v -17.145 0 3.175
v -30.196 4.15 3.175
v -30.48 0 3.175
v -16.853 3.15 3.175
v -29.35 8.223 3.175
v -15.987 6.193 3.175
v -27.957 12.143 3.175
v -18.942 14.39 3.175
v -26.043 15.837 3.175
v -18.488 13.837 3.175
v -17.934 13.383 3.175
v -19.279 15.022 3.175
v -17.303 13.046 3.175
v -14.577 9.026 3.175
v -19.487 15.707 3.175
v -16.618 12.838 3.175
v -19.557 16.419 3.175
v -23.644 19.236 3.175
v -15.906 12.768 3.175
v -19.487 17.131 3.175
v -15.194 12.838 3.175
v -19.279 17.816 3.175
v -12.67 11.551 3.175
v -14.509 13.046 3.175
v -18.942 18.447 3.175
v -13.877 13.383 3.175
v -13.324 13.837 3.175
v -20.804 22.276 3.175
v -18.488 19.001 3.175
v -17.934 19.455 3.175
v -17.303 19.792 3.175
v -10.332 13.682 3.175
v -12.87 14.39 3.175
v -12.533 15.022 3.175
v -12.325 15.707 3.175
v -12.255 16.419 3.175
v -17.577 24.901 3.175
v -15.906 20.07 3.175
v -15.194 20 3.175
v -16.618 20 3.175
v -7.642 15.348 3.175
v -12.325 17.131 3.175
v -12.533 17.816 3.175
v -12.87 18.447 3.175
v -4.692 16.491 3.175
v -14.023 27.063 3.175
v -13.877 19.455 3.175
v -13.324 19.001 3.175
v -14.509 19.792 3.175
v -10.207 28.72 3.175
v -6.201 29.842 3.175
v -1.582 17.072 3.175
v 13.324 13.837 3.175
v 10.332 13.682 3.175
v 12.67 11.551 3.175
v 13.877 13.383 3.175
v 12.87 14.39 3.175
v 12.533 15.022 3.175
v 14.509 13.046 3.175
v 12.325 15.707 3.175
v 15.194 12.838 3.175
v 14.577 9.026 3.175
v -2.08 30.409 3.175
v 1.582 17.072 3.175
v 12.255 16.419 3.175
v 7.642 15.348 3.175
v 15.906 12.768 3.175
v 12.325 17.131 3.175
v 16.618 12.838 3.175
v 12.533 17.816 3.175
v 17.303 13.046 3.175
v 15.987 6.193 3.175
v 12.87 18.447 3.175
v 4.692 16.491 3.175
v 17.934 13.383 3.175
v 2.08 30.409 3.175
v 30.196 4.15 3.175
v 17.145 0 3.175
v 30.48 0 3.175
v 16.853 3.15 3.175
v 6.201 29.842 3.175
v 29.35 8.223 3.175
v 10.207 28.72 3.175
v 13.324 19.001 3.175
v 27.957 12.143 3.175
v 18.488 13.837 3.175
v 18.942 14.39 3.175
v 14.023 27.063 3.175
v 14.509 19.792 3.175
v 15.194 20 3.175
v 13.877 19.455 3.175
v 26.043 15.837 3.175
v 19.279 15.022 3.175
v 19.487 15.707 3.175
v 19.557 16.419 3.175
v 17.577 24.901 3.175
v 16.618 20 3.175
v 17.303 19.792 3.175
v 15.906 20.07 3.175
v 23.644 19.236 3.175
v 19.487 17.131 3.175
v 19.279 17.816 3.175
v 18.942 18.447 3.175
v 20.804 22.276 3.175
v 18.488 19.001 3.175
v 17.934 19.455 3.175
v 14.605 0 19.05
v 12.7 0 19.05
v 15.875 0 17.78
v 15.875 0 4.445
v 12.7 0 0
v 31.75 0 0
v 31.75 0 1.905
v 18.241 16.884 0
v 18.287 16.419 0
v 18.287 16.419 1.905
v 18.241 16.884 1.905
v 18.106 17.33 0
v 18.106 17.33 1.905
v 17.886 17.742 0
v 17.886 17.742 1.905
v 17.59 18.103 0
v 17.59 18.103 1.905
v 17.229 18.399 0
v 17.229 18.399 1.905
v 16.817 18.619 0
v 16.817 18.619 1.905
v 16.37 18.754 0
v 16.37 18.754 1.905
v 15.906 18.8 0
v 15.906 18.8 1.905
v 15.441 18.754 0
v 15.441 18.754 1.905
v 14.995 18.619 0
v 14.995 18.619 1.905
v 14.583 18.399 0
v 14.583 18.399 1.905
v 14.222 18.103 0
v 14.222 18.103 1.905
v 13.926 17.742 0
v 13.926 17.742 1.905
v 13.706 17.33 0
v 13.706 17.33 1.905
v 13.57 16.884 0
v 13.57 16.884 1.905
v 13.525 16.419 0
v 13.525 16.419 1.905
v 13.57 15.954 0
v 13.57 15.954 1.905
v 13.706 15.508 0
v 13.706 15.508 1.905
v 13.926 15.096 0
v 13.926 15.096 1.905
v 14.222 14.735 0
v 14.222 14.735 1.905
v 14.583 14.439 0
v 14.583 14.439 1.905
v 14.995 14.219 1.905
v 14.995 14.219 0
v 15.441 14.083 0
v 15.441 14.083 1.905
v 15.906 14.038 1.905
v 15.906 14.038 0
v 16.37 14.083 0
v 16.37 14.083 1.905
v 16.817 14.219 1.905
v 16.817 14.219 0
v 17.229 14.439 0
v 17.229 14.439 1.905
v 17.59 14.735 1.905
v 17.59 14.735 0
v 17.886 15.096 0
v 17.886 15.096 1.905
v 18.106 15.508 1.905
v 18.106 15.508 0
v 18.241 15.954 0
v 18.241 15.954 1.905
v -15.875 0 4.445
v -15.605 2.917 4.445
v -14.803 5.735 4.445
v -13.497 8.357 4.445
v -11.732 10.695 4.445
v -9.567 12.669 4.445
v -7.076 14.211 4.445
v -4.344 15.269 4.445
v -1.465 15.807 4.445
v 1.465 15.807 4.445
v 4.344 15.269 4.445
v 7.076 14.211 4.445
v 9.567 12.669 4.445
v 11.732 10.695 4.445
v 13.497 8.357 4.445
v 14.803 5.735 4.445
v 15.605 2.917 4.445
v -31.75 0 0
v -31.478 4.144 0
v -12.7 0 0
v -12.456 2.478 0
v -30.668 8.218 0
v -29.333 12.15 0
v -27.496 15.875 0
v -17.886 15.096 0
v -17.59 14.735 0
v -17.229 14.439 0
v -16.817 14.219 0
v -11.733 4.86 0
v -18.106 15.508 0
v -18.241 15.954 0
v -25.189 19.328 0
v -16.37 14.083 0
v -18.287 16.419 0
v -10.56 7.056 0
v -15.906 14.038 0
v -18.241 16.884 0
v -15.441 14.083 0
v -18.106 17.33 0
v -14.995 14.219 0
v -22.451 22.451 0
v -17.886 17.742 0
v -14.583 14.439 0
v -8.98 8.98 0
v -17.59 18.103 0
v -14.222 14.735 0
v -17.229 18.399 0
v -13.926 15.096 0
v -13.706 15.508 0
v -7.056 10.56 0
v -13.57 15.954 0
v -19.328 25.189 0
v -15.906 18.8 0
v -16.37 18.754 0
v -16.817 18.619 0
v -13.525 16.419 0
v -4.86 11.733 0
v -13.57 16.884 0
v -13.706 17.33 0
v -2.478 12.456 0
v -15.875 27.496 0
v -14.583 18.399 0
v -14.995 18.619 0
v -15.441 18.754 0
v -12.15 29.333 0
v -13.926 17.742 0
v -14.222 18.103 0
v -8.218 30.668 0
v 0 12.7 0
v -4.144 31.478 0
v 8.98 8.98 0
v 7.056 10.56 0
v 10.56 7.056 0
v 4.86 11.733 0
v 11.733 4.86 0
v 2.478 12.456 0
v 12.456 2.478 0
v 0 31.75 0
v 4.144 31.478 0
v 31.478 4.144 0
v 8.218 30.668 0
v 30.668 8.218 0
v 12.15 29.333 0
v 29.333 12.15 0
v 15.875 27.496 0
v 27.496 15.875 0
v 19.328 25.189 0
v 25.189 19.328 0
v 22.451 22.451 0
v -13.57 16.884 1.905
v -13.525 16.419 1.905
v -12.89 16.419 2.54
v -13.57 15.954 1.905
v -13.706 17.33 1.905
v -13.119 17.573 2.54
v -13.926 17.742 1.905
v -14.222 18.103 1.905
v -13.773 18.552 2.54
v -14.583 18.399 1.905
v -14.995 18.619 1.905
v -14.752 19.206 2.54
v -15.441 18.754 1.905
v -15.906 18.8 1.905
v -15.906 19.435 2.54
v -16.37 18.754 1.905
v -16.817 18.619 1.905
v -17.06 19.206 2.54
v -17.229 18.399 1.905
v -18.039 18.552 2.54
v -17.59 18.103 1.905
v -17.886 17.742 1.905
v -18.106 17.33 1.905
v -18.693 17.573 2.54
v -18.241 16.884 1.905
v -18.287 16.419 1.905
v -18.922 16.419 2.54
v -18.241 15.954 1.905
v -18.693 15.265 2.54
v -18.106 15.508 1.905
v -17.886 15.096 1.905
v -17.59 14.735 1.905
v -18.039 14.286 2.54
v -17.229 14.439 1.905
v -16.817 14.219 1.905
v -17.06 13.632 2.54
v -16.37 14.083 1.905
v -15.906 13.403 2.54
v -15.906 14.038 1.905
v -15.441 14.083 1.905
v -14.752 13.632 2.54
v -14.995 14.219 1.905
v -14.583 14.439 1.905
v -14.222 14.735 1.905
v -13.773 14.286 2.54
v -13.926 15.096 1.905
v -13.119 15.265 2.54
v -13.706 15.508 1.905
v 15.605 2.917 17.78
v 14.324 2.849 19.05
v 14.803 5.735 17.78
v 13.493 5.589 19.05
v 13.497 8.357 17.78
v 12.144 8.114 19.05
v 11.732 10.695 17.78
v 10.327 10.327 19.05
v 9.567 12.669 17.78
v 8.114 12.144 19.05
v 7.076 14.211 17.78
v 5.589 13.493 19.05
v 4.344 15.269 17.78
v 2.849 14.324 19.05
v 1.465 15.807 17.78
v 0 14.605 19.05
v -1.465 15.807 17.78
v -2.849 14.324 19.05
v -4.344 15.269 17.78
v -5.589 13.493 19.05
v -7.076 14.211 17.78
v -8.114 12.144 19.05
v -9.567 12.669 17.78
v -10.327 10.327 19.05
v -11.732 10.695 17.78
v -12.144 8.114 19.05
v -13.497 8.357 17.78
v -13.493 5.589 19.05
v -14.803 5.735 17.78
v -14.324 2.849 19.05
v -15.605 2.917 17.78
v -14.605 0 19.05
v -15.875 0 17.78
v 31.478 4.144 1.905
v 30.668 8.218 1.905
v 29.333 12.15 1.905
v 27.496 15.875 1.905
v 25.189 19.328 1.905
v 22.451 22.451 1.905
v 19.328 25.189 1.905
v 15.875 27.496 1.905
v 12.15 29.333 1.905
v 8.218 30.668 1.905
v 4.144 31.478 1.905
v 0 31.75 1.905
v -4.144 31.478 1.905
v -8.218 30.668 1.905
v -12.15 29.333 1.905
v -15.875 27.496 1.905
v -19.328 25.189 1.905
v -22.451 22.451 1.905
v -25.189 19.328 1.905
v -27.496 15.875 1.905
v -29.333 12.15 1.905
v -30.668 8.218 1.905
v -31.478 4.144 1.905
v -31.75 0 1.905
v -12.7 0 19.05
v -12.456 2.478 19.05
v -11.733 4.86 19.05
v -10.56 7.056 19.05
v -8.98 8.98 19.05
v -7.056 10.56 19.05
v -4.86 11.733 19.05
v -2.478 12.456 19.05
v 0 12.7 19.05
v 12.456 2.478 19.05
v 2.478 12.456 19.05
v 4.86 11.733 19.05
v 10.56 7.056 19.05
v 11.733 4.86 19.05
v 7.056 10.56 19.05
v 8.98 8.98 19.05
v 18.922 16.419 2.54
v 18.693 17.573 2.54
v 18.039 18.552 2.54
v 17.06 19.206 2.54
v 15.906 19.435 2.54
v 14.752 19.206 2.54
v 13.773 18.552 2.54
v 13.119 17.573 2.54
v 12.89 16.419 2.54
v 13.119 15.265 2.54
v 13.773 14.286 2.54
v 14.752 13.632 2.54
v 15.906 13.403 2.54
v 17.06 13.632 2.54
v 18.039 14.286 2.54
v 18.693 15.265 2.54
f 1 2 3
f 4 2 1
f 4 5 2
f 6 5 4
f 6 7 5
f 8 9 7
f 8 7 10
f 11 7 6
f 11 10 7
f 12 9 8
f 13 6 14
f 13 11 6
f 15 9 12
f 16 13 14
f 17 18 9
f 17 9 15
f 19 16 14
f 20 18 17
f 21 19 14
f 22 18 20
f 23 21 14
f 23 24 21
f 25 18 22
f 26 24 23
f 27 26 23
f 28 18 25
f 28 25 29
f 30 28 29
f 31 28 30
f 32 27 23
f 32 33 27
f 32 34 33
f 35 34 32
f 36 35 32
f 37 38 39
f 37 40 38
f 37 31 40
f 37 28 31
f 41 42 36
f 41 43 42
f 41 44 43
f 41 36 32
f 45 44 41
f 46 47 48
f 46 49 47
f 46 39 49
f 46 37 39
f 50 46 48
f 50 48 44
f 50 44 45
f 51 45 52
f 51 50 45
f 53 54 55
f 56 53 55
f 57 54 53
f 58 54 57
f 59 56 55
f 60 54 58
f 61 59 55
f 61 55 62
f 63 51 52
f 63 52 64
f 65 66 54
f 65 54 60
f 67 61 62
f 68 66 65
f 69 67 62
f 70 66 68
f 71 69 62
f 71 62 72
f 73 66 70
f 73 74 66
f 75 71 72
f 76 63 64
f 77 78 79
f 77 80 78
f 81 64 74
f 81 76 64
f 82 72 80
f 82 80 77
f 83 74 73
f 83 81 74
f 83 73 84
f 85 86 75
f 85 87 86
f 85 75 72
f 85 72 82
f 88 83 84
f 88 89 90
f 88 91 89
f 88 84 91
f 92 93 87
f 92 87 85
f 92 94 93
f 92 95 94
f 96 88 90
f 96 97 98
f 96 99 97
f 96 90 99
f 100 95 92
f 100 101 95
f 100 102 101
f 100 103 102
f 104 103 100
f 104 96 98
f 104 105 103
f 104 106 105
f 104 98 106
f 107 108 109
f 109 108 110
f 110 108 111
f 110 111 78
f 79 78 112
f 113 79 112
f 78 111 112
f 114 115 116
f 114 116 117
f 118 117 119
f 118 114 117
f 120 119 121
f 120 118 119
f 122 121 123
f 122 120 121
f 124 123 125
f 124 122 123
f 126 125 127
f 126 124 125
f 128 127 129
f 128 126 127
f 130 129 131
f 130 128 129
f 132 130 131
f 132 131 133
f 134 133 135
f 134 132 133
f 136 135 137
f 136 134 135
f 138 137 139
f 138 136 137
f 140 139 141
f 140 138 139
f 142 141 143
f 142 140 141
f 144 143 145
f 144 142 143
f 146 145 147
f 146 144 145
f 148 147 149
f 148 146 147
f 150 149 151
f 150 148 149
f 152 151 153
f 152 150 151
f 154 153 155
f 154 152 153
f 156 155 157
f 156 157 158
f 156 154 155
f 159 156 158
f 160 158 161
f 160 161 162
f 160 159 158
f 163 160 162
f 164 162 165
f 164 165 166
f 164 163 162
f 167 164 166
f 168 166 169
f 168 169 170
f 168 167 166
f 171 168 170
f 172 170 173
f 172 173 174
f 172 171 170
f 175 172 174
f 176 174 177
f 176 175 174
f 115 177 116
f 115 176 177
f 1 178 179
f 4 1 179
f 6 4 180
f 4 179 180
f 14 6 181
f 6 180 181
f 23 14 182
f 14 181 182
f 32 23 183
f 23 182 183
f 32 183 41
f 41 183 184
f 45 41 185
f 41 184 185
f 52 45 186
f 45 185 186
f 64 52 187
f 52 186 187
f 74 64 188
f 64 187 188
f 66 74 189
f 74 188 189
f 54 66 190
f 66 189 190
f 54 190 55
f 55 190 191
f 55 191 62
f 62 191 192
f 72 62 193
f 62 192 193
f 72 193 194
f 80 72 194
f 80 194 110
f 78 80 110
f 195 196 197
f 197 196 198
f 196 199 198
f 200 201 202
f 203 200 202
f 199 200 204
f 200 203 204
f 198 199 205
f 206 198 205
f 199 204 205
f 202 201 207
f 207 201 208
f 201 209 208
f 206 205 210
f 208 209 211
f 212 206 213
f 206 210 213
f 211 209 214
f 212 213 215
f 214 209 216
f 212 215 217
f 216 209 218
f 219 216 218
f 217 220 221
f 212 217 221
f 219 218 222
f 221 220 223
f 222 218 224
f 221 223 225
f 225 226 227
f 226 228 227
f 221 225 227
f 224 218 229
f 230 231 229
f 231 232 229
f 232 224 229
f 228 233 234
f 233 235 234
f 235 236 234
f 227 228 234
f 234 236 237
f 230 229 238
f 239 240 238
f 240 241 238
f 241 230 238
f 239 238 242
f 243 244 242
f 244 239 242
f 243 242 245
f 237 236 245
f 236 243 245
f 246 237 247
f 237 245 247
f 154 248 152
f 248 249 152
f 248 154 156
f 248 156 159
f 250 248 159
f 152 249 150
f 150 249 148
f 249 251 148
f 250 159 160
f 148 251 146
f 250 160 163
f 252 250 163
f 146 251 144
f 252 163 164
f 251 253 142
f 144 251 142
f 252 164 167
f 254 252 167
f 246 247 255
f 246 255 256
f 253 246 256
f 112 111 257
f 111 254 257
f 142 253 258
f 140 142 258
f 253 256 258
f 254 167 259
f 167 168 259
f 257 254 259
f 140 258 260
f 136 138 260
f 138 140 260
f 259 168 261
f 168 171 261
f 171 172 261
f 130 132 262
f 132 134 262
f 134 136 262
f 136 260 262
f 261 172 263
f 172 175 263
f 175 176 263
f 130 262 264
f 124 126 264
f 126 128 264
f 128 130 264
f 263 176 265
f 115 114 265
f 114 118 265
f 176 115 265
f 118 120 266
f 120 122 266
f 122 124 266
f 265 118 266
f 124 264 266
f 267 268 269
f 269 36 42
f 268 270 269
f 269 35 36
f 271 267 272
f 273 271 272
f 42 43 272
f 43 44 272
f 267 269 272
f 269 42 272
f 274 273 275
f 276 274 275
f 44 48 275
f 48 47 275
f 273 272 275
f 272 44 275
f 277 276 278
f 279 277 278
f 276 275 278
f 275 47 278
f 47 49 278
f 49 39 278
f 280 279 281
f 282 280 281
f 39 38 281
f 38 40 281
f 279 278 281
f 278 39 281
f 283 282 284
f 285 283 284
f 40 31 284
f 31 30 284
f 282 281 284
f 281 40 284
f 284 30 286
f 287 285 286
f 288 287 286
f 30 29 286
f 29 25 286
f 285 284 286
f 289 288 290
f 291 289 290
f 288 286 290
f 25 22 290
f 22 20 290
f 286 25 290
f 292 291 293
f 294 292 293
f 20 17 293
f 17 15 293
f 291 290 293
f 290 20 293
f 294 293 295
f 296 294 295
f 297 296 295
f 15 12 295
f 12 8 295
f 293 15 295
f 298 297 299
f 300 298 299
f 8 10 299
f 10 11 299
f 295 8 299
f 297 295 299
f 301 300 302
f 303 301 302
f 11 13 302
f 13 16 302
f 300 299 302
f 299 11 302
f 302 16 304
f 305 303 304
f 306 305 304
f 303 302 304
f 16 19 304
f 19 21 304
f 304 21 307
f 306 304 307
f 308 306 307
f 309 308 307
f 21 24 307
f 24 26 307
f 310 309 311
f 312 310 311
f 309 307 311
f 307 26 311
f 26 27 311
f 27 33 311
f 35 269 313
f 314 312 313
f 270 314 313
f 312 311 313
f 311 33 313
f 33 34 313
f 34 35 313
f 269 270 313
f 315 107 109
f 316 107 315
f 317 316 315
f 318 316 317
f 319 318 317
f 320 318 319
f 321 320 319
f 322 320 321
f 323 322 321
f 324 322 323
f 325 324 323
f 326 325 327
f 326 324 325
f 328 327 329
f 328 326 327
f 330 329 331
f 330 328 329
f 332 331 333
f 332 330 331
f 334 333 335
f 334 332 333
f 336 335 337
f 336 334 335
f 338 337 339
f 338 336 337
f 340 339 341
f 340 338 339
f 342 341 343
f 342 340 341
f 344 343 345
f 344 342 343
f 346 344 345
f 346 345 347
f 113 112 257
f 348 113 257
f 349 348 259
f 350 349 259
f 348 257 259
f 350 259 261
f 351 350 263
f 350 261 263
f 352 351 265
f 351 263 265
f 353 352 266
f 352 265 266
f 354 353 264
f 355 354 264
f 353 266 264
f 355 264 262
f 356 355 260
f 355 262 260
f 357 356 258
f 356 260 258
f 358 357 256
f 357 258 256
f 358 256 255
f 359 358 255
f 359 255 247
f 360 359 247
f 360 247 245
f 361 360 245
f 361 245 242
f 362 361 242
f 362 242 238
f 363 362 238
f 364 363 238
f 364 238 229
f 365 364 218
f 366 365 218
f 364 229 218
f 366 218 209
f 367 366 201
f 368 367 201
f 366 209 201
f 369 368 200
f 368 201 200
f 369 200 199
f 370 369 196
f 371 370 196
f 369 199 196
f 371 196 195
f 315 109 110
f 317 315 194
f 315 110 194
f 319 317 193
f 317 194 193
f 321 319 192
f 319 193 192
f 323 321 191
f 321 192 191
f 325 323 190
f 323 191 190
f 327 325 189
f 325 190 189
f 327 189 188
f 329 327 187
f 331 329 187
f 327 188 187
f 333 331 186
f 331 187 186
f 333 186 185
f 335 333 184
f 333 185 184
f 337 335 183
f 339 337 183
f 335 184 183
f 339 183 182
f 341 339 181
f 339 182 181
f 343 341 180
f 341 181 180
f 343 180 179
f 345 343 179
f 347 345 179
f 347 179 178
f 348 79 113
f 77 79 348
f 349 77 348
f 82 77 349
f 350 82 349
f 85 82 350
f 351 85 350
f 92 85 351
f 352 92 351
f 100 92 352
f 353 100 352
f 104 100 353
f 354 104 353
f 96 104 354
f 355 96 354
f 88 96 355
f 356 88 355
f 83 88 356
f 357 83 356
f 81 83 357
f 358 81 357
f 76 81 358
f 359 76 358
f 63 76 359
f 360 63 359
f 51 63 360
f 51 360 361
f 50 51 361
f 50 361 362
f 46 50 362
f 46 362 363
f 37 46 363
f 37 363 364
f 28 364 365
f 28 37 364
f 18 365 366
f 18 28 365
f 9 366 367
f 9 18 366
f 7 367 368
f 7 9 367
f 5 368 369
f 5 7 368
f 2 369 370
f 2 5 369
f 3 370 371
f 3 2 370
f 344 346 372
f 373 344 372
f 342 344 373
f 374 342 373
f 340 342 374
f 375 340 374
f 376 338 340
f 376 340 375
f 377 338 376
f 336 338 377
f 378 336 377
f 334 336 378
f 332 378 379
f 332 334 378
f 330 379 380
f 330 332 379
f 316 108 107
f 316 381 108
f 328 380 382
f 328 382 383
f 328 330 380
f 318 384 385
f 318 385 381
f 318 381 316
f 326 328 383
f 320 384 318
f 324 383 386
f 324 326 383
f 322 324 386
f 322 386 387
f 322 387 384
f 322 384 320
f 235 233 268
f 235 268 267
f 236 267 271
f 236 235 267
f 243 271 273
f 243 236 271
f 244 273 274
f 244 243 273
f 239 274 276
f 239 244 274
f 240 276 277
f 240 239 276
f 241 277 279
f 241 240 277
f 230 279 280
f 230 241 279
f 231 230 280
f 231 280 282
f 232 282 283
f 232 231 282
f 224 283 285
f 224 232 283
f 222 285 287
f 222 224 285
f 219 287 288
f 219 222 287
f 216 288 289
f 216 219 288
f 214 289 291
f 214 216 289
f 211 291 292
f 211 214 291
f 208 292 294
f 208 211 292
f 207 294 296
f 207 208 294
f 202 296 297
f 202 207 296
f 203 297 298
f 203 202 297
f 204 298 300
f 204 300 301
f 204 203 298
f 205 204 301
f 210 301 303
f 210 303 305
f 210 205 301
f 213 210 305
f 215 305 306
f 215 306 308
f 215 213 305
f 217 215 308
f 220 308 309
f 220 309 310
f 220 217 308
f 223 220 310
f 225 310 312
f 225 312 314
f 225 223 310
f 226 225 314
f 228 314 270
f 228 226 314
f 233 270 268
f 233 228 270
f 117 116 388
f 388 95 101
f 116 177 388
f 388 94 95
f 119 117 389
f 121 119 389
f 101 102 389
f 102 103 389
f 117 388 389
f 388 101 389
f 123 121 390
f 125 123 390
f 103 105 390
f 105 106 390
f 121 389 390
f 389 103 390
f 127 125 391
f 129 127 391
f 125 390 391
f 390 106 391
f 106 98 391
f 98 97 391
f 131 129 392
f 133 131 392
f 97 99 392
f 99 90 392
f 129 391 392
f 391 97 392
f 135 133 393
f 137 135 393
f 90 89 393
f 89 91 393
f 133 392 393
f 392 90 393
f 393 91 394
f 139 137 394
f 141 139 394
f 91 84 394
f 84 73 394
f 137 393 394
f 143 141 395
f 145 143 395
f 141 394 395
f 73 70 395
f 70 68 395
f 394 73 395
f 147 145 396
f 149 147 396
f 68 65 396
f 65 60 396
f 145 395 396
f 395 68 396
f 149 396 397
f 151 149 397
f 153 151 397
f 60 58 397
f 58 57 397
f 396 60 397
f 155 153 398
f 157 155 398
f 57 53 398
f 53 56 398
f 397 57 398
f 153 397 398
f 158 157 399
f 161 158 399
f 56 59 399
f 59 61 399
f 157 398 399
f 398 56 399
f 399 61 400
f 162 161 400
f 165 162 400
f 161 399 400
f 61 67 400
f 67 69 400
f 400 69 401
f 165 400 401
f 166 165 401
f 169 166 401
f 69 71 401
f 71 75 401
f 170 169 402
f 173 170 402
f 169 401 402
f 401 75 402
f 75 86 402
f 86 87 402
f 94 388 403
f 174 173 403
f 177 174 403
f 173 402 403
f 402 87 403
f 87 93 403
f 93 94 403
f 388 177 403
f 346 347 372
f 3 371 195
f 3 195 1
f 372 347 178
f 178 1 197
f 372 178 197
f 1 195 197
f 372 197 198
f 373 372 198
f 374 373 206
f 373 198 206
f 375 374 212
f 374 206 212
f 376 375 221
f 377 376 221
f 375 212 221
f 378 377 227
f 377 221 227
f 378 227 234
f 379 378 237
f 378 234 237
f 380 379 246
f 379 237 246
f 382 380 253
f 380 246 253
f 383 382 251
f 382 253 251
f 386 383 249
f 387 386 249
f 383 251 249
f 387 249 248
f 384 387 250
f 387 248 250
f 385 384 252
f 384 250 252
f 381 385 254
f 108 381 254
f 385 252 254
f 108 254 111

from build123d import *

# Parameters (mm, degrees)
F0_R     = 2.38125
F1_DEPTH = 3.175
F2_DEPTH = 19.05
F3_SIZE  = 1.27


with BuildPart() as f1:
    # F0 (on Top) → F1 (new body)
    with BuildSketch(Plane.XY):
        with BuildLine():
            Line((15.875, 0), (31.75, 0))
            ThreePointArc((31.75, 0), (0, 31.75), (-31.75, 0))
            Line((-31.75, 0), (-15.875, 0))
            ThreePointArc((-15.875, 0), (0, 15.875), (15.875, 0))
        make_face()
        with Locations((-15.9058814723, 16.4189687431)):
            Circle(F0_R, mode=Mode.SUBTRACT)
        with Locations((15.9058814723, 16.4189687431)):
            Circle(F0_R, mode=Mode.SUBTRACT)
    extrude(amount=F1_DEPTH)

    # F0 (on Top) → F2 (join)
    with BuildSketch(Plane.XY):
        with BuildLine():
            Line((12.7, 0), (15.875, 0))
            ThreePointArc((15.875, 0), (0, 15.875), (-15.875, 0))
            Line((-15.875, 0), (-12.7, 0))
            ThreePointArc((-12.7, 0), (0, 12.7), (12.7, 0))
        make_face()
    extrude(amount=F2_DEPTH)

    # F3
    f3_edges = [f1.edges().sort_by_distance(p)[0] for p in [
        (-18.287131, 16.418969, 3.175),
        (13.524631, 16.418969, 3.175),
        (0, 31.75, 3.175),
        (0, 15.875, 19.05),
        (0, 15.875, 3.175),
    ]]
    chamfer(f3_edges, length=F3_SIZE)


solid = f1.part
